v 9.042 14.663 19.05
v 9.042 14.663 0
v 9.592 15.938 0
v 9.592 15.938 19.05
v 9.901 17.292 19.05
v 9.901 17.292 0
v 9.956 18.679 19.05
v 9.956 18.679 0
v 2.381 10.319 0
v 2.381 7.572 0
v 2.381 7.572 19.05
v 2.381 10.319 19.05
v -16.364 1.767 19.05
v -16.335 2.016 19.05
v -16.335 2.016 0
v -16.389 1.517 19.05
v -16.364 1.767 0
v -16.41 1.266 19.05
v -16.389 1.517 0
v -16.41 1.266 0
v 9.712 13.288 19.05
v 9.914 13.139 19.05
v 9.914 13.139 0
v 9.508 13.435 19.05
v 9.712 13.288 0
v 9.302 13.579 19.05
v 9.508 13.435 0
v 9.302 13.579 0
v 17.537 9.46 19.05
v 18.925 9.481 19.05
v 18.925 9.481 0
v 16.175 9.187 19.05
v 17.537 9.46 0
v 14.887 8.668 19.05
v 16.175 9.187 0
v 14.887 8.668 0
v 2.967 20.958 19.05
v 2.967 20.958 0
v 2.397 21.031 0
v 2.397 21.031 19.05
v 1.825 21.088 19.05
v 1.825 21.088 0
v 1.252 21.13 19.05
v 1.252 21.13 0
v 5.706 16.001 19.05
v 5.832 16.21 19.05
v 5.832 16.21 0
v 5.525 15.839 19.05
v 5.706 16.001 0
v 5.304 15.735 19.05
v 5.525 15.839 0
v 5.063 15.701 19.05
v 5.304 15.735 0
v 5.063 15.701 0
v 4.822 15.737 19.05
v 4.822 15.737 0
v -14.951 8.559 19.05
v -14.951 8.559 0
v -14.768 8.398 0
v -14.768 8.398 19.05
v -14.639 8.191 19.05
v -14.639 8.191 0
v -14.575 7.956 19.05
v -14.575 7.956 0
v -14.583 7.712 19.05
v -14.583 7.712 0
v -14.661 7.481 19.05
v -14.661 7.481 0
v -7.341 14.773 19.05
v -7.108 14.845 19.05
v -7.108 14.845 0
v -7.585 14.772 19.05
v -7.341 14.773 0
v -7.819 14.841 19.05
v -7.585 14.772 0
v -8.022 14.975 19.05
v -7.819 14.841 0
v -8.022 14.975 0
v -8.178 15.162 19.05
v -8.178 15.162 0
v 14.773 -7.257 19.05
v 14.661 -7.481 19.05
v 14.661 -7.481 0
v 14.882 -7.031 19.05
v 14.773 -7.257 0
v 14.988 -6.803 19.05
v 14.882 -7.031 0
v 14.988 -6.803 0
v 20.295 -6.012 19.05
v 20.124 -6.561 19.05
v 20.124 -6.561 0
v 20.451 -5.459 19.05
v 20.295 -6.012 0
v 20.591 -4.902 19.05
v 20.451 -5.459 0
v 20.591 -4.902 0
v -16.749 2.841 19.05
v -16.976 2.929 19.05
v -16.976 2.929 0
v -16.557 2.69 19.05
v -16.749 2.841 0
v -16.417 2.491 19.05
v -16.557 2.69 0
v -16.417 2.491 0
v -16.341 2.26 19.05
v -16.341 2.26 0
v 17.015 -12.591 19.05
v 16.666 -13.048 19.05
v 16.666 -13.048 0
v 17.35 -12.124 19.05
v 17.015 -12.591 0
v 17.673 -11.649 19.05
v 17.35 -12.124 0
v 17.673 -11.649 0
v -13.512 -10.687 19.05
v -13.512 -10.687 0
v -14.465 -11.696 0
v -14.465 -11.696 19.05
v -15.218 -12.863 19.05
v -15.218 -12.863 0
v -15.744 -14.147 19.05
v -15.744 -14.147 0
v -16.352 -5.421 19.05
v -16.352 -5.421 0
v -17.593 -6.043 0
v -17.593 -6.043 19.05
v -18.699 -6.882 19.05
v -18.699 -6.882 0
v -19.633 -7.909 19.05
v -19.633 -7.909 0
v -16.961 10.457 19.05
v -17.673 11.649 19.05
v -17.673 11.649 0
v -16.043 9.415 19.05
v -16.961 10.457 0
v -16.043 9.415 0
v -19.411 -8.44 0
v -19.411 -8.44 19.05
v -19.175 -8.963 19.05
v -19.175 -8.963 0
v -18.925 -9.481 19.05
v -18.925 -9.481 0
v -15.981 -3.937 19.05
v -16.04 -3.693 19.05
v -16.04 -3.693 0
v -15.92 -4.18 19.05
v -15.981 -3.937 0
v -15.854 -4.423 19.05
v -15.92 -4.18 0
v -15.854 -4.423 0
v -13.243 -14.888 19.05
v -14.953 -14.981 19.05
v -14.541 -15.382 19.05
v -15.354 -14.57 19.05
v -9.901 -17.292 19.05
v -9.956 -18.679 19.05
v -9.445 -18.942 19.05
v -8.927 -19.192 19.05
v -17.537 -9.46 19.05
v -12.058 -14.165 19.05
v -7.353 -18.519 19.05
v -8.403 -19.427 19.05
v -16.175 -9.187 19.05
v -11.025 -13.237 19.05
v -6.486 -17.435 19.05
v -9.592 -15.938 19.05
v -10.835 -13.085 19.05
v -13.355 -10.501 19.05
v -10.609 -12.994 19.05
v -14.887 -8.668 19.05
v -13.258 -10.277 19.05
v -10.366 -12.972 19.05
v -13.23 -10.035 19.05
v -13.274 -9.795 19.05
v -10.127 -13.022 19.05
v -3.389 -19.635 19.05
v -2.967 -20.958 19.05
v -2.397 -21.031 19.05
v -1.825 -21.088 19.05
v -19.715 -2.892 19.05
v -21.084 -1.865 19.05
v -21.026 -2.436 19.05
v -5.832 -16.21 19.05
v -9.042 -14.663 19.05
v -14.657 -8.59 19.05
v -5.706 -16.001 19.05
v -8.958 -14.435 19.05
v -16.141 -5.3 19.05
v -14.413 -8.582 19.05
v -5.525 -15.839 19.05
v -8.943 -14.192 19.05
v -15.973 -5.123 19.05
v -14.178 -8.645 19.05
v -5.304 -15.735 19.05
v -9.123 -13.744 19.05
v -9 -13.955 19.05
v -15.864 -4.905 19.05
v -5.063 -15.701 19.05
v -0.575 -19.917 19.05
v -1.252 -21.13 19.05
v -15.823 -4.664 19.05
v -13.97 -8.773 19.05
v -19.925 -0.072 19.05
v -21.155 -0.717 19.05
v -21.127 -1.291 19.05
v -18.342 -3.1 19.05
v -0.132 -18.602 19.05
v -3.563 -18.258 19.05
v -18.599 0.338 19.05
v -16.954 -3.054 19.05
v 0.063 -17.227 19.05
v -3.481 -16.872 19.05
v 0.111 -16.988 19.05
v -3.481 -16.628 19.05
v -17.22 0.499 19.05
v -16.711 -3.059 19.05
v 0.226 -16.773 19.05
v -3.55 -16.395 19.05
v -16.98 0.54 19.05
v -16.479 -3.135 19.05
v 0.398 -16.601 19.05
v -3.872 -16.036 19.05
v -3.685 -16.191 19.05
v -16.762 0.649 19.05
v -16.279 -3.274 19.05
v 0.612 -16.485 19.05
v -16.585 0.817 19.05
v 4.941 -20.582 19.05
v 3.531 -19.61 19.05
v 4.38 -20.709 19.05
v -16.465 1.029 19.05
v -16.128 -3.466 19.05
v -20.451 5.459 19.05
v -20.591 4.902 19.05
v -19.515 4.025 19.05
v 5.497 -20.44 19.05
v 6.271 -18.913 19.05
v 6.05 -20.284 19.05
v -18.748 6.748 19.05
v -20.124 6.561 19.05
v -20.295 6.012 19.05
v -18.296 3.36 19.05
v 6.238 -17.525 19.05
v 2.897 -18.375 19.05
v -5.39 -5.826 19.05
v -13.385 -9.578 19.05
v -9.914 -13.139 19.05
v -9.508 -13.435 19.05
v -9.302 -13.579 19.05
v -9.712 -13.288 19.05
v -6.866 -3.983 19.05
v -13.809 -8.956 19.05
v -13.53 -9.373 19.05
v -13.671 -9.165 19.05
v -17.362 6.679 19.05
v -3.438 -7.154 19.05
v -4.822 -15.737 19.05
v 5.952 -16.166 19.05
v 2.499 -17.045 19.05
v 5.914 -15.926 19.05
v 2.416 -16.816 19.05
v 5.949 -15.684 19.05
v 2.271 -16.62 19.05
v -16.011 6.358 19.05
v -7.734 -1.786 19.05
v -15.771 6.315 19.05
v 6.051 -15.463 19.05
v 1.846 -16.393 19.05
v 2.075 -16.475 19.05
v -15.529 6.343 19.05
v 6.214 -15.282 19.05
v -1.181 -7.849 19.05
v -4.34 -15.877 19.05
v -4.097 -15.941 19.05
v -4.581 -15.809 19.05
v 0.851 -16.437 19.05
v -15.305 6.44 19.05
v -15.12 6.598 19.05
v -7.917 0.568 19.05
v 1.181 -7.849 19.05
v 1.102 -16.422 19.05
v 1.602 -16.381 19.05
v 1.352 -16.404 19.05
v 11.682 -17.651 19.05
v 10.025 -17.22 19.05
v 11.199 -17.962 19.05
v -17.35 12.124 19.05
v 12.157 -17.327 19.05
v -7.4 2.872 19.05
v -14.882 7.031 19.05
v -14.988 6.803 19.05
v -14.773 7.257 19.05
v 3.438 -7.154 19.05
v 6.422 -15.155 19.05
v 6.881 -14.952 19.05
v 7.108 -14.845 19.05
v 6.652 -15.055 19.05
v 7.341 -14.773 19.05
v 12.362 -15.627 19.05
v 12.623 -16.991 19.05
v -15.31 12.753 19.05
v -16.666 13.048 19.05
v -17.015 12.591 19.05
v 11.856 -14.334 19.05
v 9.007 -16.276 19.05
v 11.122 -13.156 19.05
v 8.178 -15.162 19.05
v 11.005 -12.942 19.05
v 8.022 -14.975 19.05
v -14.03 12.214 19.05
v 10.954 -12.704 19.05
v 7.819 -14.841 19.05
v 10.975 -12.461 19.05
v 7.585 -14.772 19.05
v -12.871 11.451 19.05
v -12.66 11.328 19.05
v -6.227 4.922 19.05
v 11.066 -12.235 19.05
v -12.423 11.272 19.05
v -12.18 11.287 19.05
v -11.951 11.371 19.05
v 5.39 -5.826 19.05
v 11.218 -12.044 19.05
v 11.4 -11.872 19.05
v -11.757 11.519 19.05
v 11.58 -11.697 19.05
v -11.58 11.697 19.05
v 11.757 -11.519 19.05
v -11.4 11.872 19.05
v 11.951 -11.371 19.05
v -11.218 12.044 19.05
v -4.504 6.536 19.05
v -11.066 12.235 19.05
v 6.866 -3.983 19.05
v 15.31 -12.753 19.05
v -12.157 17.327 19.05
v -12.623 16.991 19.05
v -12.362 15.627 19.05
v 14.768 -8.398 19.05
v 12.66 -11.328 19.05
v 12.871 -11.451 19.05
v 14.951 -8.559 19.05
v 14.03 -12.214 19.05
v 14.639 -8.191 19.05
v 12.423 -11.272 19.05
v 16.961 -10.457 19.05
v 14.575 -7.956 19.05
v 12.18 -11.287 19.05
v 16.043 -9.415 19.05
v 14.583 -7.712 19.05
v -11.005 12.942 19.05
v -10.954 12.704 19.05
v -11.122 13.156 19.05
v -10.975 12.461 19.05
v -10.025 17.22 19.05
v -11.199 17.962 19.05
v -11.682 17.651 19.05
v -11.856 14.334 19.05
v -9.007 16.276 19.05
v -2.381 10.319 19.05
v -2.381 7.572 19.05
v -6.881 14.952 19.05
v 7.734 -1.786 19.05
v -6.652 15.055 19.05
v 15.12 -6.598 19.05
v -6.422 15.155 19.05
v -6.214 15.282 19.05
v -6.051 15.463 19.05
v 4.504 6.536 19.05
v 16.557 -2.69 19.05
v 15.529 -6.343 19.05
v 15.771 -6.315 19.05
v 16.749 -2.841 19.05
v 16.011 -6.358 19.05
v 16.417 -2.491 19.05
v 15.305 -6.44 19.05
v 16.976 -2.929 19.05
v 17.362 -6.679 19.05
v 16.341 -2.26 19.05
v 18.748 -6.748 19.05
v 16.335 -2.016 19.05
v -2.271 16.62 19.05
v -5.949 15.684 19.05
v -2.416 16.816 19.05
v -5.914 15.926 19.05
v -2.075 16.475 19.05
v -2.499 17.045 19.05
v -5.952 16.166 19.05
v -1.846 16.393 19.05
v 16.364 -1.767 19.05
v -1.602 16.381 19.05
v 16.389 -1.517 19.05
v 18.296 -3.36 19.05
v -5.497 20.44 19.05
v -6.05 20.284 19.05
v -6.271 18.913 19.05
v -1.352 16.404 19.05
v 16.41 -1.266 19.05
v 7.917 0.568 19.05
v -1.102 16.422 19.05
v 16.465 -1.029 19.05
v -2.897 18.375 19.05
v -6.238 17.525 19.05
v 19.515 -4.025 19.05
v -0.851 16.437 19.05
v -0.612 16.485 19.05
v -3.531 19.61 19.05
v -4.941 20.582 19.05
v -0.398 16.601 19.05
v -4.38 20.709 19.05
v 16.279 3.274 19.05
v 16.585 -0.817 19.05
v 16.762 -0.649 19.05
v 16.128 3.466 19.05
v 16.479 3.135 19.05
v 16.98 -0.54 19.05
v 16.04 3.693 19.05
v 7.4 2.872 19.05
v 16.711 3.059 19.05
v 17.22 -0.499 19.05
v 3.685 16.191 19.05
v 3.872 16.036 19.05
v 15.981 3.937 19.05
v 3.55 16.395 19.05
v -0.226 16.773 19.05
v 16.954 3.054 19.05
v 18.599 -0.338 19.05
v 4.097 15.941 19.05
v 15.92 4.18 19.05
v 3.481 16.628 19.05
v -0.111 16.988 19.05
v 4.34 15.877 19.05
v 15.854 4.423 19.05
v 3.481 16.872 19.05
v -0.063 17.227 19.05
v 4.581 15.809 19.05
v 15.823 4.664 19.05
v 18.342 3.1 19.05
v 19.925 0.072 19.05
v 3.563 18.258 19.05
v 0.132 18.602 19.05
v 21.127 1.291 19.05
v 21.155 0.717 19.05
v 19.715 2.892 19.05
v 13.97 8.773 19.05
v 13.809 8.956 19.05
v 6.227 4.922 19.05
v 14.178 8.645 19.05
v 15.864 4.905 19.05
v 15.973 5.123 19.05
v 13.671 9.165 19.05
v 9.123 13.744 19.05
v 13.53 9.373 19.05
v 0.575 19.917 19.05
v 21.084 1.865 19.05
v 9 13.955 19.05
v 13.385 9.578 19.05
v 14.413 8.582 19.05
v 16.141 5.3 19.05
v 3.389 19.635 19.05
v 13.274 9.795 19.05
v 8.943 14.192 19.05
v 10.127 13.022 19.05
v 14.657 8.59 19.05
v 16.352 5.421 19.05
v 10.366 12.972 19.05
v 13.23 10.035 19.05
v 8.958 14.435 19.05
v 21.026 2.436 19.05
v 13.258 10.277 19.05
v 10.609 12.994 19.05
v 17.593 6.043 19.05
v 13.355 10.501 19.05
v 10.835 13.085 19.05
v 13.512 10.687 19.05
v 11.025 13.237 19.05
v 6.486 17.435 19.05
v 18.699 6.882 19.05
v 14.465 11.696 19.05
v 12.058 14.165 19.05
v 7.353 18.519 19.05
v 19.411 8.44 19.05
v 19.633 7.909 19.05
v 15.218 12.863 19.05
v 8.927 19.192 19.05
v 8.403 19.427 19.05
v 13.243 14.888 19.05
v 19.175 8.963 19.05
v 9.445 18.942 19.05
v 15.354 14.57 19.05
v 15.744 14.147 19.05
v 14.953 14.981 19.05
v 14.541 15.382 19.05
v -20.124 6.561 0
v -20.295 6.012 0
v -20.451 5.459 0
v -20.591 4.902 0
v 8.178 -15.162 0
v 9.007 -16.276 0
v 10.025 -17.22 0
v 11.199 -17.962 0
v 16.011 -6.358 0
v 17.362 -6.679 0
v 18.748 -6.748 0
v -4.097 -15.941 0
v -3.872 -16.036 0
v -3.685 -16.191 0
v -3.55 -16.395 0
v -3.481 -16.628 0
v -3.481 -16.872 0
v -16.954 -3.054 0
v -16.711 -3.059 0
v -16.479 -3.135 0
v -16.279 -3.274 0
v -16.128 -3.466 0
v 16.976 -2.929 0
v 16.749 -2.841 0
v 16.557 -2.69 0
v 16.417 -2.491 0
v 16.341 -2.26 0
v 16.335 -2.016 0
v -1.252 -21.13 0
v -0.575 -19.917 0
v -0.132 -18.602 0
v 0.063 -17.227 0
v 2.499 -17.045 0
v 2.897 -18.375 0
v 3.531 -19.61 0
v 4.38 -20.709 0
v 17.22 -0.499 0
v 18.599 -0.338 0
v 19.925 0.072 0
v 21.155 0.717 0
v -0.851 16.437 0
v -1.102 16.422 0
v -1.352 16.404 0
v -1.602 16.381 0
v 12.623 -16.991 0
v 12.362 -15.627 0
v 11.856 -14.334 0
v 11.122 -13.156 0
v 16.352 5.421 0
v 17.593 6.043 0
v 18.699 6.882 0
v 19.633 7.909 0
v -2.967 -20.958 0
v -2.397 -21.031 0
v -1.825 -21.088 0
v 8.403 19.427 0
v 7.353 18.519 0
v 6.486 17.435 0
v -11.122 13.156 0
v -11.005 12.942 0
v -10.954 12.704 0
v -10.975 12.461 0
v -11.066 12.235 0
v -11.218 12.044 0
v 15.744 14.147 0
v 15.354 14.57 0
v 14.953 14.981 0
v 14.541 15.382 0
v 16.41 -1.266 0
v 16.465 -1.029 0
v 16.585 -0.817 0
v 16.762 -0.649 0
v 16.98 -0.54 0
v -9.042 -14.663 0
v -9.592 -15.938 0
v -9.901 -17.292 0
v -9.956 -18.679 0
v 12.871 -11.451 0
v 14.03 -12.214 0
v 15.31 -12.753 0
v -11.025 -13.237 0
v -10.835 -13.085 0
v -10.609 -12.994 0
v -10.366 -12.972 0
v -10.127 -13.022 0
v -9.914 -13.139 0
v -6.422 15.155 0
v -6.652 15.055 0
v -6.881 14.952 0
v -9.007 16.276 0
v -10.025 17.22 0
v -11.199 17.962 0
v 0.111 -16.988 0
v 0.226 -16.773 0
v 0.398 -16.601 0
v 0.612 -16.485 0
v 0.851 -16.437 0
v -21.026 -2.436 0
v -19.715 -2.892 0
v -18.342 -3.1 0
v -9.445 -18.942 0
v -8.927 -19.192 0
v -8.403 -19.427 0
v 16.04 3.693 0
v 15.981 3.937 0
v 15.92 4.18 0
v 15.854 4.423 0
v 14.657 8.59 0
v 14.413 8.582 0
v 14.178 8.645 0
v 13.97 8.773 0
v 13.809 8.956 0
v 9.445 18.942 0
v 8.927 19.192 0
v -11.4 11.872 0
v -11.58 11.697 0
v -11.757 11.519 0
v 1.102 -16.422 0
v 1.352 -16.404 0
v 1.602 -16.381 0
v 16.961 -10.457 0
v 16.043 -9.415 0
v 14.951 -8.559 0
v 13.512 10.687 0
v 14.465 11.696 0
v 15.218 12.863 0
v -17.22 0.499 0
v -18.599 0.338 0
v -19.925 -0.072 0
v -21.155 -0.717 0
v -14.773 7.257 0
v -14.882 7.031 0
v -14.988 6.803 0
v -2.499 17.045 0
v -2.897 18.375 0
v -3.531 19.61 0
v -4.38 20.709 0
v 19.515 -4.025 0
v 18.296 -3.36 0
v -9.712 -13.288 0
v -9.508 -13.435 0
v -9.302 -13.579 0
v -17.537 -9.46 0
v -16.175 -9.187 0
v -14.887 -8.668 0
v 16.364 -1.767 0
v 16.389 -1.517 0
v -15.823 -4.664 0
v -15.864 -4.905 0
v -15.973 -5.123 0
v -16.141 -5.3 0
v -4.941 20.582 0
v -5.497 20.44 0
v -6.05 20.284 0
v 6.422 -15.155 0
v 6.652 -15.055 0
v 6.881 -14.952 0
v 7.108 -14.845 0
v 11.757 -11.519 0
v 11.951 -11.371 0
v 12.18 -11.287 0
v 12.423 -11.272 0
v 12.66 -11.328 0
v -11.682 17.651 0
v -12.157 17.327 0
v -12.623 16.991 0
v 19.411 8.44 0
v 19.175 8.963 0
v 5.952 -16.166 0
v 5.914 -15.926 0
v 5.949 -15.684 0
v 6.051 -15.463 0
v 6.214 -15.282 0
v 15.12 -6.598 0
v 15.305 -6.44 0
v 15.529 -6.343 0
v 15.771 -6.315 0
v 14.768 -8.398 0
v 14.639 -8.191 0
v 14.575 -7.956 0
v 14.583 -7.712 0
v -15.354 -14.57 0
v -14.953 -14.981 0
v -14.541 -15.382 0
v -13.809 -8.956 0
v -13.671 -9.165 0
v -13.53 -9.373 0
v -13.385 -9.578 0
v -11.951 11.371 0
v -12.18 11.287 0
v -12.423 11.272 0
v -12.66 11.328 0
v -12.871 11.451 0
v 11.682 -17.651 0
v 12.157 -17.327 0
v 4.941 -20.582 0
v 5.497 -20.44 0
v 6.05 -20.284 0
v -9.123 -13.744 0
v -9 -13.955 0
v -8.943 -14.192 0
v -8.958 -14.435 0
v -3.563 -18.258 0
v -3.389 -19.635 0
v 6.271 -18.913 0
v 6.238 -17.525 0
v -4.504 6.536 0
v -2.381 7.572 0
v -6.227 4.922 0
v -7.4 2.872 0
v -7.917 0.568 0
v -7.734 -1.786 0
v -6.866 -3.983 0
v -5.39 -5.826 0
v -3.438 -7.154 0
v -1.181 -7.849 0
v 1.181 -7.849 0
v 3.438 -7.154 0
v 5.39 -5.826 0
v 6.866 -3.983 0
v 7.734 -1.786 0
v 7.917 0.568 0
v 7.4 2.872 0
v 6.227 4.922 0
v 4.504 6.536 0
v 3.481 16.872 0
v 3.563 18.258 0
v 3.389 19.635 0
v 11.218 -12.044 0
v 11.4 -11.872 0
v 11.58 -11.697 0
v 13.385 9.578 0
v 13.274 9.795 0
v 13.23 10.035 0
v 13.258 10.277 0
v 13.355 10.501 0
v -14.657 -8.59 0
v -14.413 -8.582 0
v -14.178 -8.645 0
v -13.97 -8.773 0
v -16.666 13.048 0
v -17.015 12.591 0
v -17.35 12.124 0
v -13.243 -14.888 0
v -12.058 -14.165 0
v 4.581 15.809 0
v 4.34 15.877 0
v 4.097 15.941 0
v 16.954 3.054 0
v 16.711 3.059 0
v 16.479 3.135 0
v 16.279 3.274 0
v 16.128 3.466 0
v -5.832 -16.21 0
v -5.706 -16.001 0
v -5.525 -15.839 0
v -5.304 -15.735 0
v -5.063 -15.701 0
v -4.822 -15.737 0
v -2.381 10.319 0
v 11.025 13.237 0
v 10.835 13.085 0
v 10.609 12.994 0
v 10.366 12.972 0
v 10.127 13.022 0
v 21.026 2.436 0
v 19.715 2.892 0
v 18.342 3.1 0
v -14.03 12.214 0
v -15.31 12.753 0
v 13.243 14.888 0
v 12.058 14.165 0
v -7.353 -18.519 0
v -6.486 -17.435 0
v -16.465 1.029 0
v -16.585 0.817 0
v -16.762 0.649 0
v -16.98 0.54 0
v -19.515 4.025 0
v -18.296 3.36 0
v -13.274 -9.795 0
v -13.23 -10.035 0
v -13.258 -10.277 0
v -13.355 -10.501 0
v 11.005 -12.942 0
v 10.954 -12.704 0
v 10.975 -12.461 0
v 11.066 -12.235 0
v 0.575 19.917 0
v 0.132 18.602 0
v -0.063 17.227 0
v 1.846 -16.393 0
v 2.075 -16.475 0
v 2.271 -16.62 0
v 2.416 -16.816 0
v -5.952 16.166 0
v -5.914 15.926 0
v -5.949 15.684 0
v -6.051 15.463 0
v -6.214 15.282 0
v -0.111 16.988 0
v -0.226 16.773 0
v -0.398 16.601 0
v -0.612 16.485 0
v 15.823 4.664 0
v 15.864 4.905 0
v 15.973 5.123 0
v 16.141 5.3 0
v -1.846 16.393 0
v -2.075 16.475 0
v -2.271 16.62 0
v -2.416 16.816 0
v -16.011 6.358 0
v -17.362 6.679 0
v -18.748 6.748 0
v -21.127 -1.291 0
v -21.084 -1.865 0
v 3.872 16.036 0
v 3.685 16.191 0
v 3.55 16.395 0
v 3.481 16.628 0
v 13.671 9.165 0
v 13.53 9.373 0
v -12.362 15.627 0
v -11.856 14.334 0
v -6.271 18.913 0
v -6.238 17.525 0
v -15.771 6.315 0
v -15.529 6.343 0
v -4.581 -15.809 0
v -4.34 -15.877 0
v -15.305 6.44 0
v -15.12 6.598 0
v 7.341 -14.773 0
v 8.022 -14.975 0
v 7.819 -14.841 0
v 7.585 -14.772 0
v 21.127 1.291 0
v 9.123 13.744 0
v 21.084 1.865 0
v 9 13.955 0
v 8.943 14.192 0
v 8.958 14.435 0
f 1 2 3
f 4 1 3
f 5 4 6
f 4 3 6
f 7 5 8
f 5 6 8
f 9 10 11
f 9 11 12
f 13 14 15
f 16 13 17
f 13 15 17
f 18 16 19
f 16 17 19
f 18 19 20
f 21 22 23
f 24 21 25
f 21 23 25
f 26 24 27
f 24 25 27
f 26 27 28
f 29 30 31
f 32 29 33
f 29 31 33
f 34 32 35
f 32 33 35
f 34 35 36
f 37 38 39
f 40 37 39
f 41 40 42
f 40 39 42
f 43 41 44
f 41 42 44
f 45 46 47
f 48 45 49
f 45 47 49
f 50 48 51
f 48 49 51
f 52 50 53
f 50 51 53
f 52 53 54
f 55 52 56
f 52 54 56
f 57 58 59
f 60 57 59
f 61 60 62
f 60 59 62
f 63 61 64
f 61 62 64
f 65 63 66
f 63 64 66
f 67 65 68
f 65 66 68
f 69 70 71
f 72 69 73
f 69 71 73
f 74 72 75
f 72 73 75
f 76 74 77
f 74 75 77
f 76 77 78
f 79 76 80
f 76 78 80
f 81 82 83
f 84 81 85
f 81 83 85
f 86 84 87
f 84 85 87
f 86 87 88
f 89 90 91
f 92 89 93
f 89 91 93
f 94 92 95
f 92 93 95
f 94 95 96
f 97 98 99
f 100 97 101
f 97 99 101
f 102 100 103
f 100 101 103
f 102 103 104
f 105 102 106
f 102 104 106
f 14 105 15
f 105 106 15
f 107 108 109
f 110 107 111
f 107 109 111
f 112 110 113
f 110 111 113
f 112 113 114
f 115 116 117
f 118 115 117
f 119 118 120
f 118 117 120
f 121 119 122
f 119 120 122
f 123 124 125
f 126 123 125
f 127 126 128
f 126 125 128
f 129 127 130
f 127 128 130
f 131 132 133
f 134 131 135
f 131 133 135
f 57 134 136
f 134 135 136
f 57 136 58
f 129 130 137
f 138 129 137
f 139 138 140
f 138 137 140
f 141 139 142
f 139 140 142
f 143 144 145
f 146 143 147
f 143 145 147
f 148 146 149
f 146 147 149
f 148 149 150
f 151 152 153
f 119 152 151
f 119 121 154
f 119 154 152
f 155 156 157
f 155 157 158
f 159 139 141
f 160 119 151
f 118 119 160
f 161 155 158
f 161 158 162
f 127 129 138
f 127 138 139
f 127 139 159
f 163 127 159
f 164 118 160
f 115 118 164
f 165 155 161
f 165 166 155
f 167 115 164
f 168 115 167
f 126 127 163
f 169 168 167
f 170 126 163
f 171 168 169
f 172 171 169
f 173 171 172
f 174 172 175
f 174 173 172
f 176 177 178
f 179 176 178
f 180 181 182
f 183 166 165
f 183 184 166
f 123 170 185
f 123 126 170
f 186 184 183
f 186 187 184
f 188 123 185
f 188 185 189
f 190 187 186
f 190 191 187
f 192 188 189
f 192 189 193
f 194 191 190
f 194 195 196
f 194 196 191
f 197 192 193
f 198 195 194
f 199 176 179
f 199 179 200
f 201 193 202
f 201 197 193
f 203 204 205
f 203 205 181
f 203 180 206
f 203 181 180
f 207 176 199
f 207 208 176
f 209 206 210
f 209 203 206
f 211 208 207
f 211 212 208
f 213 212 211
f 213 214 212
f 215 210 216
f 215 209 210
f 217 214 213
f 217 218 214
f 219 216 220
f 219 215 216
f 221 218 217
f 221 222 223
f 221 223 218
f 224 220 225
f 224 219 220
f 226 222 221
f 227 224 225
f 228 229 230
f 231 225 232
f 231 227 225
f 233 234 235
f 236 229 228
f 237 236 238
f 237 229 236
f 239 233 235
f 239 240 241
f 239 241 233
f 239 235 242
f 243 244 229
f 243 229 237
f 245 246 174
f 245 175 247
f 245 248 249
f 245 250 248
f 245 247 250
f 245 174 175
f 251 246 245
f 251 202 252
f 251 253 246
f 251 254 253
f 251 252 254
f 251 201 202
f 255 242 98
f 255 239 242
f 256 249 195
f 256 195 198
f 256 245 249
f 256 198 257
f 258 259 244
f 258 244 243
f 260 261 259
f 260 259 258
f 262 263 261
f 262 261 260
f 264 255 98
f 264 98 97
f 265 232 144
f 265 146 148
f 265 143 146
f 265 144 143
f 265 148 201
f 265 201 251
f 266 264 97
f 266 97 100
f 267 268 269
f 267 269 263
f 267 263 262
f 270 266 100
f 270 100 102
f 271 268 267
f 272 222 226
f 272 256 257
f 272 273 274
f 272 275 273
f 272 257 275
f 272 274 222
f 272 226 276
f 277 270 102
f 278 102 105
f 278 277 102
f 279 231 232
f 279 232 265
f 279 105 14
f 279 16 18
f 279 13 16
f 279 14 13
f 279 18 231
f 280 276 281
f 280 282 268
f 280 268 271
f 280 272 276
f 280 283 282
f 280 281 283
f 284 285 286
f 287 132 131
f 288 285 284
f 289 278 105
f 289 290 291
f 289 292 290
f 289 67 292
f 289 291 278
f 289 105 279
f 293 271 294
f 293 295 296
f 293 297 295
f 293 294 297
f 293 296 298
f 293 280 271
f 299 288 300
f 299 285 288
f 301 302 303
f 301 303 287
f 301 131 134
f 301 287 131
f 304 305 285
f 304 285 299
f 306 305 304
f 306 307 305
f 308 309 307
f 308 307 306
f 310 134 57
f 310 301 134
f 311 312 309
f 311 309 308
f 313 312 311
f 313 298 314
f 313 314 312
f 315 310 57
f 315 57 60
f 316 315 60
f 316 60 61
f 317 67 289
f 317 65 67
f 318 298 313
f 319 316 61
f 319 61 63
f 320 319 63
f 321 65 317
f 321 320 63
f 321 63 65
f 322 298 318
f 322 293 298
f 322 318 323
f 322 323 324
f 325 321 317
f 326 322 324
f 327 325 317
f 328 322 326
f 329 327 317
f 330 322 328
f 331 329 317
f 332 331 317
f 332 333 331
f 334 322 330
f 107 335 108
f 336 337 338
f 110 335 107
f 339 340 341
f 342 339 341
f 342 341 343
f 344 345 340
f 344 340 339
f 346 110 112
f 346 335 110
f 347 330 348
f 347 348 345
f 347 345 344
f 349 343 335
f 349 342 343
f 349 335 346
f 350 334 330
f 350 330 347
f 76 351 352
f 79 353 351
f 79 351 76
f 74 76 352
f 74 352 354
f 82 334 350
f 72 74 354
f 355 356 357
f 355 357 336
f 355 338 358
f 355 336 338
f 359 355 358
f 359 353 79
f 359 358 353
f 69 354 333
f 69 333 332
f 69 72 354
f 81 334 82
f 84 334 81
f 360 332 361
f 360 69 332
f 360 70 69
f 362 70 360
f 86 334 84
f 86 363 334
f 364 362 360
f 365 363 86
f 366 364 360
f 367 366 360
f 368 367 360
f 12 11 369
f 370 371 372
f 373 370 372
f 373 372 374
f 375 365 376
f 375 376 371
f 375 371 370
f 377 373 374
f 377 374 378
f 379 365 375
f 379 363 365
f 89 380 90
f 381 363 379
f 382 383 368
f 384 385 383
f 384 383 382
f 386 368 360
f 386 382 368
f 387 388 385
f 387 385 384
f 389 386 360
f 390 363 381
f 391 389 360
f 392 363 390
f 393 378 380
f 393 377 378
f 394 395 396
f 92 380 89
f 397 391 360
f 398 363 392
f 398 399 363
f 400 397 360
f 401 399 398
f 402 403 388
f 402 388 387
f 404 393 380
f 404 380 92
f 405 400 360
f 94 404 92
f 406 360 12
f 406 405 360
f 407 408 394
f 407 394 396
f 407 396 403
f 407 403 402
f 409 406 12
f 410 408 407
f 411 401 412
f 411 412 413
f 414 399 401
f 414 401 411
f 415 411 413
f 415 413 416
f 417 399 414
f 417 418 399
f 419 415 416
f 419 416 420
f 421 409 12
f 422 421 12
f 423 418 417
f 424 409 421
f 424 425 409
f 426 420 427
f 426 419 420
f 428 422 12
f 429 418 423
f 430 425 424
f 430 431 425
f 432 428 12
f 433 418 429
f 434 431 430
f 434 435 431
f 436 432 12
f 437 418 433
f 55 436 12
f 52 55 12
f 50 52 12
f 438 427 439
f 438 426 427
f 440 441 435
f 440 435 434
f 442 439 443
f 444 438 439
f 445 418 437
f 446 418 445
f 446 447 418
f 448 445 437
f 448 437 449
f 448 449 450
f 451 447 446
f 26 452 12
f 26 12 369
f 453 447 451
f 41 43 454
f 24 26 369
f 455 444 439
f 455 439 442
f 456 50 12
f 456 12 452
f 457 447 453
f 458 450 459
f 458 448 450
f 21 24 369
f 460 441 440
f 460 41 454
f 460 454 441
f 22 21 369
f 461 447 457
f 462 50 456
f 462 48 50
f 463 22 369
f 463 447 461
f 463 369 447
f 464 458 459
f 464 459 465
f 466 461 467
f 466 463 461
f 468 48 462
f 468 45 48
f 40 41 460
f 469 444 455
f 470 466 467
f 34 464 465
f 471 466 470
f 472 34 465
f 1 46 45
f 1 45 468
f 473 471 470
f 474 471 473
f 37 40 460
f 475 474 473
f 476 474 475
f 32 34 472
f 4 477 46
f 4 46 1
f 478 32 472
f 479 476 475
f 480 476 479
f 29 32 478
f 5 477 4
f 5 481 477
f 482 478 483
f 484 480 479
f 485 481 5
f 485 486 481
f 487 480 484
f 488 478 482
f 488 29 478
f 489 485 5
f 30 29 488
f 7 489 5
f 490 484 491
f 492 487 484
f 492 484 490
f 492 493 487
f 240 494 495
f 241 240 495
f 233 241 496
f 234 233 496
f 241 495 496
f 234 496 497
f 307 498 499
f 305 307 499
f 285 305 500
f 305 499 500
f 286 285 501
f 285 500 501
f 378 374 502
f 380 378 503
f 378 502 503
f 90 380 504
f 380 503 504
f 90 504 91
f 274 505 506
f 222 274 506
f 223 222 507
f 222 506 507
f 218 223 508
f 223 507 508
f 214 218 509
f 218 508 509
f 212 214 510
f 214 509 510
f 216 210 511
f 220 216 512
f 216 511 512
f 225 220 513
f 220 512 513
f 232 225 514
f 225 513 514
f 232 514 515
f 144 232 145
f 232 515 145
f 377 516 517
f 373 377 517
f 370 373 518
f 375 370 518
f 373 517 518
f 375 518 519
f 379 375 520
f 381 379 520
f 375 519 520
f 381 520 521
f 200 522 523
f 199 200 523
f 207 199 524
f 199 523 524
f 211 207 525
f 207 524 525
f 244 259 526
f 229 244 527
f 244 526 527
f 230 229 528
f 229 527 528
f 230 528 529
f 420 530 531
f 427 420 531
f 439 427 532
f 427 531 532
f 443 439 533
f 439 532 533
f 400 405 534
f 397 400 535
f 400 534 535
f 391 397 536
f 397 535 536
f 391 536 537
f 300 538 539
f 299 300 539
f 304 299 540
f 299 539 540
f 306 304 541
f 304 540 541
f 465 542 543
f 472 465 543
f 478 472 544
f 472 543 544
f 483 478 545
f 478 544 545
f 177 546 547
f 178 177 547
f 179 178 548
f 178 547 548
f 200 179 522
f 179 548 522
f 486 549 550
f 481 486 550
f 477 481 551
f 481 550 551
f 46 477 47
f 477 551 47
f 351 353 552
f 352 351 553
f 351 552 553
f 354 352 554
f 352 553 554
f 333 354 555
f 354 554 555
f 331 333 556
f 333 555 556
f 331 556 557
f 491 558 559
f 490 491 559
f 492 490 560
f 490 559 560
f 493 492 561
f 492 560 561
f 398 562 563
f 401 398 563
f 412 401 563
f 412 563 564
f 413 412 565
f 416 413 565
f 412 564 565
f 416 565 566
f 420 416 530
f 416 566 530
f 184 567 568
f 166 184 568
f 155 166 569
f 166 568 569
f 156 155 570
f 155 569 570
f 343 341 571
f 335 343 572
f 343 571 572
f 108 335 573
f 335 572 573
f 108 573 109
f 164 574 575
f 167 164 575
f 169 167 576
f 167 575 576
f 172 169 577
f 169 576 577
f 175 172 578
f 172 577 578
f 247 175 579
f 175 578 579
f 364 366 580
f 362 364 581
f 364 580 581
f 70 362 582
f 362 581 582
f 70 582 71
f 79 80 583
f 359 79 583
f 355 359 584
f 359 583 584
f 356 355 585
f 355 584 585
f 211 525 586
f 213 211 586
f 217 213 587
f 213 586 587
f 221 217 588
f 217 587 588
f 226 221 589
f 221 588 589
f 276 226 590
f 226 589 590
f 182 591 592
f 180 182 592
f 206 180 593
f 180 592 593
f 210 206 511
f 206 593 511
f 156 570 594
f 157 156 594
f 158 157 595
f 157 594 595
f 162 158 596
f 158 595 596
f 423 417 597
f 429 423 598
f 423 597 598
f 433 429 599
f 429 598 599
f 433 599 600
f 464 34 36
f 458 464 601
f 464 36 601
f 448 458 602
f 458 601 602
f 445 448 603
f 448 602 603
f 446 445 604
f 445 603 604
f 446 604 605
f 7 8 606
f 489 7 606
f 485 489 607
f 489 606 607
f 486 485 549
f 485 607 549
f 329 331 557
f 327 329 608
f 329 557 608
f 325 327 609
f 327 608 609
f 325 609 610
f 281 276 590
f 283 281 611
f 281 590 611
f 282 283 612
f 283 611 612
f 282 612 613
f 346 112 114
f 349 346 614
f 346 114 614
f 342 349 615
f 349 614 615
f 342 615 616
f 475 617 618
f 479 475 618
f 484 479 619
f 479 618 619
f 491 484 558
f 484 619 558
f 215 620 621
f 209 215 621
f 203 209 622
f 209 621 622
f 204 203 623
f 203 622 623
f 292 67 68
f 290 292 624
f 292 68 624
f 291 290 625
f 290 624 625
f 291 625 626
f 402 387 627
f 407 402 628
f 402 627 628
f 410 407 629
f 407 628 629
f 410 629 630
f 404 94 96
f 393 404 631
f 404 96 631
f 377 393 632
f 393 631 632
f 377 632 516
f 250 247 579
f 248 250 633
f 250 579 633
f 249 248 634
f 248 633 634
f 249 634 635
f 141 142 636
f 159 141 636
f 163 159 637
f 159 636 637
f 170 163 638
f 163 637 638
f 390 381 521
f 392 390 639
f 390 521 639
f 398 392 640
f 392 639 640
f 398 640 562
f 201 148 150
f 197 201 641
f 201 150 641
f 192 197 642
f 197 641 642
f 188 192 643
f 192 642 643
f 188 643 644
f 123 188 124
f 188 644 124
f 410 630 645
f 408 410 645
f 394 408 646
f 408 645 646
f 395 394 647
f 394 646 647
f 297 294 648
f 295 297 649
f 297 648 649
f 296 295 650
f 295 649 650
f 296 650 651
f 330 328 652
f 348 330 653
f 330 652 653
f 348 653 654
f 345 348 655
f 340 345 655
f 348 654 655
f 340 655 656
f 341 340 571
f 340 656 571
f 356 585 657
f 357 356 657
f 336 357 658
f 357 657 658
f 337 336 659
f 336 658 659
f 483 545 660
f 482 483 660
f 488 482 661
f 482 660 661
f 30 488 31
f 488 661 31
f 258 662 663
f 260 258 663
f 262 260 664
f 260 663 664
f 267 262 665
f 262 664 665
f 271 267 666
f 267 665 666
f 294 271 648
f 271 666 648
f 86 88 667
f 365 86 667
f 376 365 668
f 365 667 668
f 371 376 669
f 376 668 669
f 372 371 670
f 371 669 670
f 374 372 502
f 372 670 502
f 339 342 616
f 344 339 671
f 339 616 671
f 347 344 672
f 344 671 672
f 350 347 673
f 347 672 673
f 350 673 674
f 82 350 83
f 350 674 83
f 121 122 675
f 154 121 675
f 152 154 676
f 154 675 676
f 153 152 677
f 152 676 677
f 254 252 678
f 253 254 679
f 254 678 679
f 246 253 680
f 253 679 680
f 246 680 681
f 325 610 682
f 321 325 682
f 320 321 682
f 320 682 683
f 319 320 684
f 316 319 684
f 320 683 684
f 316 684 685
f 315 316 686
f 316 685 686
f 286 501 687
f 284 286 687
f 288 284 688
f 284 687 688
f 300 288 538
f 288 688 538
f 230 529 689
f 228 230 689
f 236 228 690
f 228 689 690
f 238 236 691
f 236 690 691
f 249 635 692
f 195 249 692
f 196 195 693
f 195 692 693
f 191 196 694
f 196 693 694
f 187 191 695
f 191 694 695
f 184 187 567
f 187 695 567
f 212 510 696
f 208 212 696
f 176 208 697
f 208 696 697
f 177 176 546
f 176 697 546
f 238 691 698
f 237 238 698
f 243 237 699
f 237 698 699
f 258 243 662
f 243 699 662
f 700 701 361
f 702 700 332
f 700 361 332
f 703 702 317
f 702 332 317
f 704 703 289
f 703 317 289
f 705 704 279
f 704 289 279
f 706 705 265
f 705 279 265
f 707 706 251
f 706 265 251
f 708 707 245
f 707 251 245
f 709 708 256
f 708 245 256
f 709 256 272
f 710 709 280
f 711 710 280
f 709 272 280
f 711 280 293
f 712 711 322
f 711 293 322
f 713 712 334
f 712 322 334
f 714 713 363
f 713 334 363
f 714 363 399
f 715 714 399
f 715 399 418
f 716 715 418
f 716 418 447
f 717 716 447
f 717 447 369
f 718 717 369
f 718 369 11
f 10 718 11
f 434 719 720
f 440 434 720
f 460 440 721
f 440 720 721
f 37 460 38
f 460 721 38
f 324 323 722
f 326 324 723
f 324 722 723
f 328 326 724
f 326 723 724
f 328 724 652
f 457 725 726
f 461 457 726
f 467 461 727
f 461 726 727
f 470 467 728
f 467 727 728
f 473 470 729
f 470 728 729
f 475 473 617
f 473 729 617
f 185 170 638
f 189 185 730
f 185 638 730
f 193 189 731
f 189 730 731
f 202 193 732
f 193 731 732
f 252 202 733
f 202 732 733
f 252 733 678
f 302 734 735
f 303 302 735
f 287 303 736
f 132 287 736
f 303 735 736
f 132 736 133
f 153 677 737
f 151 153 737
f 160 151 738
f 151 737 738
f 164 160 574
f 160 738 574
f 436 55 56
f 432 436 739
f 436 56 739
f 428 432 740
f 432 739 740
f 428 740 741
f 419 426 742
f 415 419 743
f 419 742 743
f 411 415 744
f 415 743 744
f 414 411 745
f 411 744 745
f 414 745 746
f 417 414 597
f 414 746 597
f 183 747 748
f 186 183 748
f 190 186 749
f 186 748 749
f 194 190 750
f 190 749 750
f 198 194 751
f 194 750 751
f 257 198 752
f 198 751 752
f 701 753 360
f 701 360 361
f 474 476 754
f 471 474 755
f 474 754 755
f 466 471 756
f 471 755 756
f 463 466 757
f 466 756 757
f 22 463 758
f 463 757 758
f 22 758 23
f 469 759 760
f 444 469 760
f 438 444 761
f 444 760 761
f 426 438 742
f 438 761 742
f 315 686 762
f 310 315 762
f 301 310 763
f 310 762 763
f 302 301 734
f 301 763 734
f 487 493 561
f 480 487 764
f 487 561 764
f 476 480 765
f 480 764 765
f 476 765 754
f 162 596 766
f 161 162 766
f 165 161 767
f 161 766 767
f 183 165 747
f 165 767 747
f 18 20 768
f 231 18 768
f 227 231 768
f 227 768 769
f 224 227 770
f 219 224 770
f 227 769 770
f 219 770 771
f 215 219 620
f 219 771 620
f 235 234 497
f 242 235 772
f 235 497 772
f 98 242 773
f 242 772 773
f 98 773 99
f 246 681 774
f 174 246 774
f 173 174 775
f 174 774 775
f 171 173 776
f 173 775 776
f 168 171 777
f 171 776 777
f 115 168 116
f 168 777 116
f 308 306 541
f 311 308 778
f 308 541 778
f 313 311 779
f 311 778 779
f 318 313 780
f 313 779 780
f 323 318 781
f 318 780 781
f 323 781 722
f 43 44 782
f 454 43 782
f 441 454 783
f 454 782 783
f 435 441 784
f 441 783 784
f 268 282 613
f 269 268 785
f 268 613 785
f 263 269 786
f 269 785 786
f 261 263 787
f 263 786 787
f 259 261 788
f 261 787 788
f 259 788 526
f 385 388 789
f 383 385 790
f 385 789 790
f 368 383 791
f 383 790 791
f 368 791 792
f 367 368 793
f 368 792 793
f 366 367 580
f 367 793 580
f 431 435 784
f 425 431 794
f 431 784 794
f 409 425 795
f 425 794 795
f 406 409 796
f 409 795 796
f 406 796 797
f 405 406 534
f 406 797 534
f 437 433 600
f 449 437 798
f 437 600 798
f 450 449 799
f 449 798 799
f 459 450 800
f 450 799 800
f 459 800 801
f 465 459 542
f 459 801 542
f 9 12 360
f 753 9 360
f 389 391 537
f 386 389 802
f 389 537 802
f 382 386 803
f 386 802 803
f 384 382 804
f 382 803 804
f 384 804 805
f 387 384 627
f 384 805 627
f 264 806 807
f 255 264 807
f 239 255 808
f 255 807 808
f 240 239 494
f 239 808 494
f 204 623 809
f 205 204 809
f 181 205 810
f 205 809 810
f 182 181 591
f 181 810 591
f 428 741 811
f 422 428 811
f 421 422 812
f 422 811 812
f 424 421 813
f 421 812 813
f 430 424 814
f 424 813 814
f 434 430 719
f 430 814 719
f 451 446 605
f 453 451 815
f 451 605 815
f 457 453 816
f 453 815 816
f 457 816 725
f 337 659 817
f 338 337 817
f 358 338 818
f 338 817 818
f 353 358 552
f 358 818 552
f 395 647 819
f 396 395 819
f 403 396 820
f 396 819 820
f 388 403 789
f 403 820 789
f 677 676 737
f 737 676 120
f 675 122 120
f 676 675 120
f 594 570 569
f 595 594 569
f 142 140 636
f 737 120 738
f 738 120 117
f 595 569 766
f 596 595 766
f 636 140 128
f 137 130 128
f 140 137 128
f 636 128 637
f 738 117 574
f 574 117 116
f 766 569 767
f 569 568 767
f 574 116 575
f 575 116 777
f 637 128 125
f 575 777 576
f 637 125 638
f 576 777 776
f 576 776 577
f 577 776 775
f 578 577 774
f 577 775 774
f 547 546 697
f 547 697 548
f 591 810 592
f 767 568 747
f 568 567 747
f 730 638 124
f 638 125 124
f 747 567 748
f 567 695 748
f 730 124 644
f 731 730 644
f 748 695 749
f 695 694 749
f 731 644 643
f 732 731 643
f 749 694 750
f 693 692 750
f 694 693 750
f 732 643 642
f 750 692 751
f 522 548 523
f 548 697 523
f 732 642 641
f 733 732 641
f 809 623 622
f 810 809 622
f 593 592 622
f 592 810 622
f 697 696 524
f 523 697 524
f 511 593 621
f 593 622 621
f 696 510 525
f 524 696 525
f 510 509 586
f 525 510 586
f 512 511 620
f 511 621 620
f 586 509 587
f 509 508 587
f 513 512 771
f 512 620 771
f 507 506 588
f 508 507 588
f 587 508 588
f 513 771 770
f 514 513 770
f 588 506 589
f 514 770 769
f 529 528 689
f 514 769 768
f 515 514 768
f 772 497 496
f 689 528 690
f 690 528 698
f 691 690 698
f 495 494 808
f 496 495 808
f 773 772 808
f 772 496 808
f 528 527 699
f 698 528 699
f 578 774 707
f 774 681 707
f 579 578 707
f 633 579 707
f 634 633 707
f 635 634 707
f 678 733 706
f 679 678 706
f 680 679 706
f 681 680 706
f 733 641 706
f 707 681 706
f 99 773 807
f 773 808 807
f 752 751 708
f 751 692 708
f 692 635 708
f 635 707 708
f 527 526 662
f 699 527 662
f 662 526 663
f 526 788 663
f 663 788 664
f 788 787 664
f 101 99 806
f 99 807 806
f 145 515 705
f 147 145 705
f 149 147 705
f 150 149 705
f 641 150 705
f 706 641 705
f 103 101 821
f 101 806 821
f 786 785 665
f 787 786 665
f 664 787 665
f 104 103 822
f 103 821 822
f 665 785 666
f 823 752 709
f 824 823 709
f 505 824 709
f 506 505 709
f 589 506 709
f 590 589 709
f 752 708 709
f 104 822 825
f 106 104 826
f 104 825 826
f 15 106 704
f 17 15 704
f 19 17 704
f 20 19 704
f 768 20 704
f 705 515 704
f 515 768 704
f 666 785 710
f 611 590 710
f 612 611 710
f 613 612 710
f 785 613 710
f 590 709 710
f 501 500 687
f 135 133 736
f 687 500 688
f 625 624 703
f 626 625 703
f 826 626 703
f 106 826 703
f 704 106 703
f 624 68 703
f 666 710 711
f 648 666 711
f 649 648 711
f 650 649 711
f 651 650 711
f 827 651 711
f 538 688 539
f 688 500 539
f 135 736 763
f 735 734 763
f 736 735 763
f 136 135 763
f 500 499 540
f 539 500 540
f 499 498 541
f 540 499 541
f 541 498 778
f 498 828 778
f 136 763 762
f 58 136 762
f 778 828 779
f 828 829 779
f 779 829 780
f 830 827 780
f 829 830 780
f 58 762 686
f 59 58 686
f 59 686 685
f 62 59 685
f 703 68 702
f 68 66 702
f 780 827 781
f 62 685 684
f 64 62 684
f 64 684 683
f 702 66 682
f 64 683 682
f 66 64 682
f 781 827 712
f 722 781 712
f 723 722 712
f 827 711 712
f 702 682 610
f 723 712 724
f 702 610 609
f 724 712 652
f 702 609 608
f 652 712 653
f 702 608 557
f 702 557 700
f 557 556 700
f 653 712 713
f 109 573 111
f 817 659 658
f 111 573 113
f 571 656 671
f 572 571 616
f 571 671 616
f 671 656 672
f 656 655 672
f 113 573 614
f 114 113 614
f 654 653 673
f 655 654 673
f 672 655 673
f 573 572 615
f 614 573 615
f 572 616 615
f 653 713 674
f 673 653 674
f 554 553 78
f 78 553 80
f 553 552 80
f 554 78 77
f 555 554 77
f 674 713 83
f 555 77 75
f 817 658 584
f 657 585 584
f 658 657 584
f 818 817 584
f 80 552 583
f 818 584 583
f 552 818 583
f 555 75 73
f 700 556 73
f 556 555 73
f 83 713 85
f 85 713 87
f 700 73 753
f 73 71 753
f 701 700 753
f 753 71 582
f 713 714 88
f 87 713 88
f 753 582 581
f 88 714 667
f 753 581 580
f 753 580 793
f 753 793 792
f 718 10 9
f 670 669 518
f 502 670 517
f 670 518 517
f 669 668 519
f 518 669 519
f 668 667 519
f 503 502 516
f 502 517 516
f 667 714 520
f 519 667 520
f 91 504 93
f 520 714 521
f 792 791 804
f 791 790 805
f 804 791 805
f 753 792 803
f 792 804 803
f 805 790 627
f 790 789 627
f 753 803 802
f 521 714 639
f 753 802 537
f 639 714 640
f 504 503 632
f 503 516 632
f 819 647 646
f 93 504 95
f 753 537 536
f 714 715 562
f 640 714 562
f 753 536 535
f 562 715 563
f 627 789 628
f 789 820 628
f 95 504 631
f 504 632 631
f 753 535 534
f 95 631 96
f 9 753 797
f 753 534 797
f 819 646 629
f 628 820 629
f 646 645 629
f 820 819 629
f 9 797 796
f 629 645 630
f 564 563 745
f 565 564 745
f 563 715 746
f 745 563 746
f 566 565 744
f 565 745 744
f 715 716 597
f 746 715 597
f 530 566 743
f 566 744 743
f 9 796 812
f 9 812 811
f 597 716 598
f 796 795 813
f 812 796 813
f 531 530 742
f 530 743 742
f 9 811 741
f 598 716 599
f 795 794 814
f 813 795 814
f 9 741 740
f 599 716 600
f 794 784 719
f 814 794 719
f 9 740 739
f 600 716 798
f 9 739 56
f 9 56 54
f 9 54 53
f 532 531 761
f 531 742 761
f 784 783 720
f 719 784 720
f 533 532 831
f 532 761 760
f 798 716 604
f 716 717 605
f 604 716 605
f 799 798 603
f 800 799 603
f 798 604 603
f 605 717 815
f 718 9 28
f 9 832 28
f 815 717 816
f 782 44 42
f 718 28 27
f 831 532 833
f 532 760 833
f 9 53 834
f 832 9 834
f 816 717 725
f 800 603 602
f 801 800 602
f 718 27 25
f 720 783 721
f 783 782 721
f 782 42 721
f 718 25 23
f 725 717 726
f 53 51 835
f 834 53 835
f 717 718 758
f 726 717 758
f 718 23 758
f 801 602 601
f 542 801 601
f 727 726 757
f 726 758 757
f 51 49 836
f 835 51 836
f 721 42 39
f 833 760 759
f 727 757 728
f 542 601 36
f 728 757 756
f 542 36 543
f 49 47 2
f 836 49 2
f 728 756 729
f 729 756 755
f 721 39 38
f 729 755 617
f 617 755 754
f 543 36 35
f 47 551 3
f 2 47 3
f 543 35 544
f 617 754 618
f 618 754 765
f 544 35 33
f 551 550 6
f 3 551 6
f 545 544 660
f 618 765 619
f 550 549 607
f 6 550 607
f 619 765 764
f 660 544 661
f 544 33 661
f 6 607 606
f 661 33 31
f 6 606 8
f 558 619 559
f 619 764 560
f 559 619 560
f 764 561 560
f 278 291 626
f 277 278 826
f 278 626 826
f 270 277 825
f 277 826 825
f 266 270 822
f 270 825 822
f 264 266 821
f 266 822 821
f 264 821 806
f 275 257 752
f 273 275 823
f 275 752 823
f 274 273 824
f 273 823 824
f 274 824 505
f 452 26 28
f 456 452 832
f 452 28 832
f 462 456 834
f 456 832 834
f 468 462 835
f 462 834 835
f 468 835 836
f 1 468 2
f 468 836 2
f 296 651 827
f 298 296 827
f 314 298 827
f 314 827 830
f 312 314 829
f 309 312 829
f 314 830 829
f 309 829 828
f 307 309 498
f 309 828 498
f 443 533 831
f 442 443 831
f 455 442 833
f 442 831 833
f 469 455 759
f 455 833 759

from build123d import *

# Parameters (mm, degrees)
SKETCH3_R          = 21.166666667
GEARBODY_DEPTH     = 19.05
TOOTHCUT_DEPTH     = 20.05
CIRPATTERN1_COUNT  = 18
BOREDIA_R          = 7.9375
BORE_DEPTH         = 12700
CUT_EXTRUDE1_DEPTH = 20.05


with BuildPart() as part:
    # Sketch3 → gearBody (new body)
    with BuildSketch(Plane.XY):
        Circle(SKETCH3_R)
    extrude(amount=GEARBODY_DEPTH)

    # Sketch2 → toothCut (cut, through all)
    with BuildSketch(Plane.XY):
        with BuildLine():
            ThreePointArc((16.335269031, -2.015998593), (16.377127438, -1.641633799), (16.410407448, -1.266409111))
            ThreePointArc((16.410407448, -1.266409111), (16.667413848, -0.726792607), (17.219915542, -0.498801072))
            ThreePointArc((17.219915542, -0.498801072), (20.650307967, 0.417339666), (23.283949955, 2.798691365))
            ThreePointArc((23.283949955, 2.798691365), (23.334606399, -2.339047473), (22.265196368, -7.364511495))
            ThreePointArc((22.265196368, -7.364511495), (20.156614608, -4.507802025), (16.976312891, -2.929009122))
            ThreePointArc((16.976312891, -2.929009122), (16.480056536, -2.595890687), (16.335269031, -2.015998593))
        make_face()
    toothcut = extrude(amount=TOOTHCUT_DEPTH, mode=Mode.SUBTRACT)

    # CirPattern1: toothCut ×18 about axis
    cirpattern1_axis = Axis((0, 0, 0), (0, 0, 1))
    for i in range(1, CIRPATTERN1_COUNT):
        add(toothcut.rotate(cirpattern1_axis, i * 360 / CIRPATTERN1_COUNT), mode=Mode.SUBTRACT)

    # boreDia → bore (cut, symmetric)
    with BuildSketch(Plane.XY):
        Circle(BOREDIA_R)
    extrude(amount=BORE_DEPTH, both=True, mode=Mode.SUBTRACT)

    # Sketch4 → Cut-Extrude1 (cut, through all)
    with BuildSketch(Plane(origin=(0, 0, 0), x_dir=(-1, 0, 0), z_dir=(0, 0, -1))):
        with BuildLine():
            Line((0, 10.31875), (2.38125, 10.31875))
            Line((2.38125, 10.31875), (2.38125, 7.571892411))
            ThreePointArc((2.38125, 7.571892411), (0, 7.9375), (-2.38125, 7.571892411))
            Line((-2.38125, 7.571892411), (-2.38125, 10.31875))
            Line((-2.38125, 10.31875), (0, 10.31875))
        make_face()
    extrude(amount=-CUT_EXTRUDE1_DEPTH, mode=Mode.SUBTRACT)


solid = part.part
